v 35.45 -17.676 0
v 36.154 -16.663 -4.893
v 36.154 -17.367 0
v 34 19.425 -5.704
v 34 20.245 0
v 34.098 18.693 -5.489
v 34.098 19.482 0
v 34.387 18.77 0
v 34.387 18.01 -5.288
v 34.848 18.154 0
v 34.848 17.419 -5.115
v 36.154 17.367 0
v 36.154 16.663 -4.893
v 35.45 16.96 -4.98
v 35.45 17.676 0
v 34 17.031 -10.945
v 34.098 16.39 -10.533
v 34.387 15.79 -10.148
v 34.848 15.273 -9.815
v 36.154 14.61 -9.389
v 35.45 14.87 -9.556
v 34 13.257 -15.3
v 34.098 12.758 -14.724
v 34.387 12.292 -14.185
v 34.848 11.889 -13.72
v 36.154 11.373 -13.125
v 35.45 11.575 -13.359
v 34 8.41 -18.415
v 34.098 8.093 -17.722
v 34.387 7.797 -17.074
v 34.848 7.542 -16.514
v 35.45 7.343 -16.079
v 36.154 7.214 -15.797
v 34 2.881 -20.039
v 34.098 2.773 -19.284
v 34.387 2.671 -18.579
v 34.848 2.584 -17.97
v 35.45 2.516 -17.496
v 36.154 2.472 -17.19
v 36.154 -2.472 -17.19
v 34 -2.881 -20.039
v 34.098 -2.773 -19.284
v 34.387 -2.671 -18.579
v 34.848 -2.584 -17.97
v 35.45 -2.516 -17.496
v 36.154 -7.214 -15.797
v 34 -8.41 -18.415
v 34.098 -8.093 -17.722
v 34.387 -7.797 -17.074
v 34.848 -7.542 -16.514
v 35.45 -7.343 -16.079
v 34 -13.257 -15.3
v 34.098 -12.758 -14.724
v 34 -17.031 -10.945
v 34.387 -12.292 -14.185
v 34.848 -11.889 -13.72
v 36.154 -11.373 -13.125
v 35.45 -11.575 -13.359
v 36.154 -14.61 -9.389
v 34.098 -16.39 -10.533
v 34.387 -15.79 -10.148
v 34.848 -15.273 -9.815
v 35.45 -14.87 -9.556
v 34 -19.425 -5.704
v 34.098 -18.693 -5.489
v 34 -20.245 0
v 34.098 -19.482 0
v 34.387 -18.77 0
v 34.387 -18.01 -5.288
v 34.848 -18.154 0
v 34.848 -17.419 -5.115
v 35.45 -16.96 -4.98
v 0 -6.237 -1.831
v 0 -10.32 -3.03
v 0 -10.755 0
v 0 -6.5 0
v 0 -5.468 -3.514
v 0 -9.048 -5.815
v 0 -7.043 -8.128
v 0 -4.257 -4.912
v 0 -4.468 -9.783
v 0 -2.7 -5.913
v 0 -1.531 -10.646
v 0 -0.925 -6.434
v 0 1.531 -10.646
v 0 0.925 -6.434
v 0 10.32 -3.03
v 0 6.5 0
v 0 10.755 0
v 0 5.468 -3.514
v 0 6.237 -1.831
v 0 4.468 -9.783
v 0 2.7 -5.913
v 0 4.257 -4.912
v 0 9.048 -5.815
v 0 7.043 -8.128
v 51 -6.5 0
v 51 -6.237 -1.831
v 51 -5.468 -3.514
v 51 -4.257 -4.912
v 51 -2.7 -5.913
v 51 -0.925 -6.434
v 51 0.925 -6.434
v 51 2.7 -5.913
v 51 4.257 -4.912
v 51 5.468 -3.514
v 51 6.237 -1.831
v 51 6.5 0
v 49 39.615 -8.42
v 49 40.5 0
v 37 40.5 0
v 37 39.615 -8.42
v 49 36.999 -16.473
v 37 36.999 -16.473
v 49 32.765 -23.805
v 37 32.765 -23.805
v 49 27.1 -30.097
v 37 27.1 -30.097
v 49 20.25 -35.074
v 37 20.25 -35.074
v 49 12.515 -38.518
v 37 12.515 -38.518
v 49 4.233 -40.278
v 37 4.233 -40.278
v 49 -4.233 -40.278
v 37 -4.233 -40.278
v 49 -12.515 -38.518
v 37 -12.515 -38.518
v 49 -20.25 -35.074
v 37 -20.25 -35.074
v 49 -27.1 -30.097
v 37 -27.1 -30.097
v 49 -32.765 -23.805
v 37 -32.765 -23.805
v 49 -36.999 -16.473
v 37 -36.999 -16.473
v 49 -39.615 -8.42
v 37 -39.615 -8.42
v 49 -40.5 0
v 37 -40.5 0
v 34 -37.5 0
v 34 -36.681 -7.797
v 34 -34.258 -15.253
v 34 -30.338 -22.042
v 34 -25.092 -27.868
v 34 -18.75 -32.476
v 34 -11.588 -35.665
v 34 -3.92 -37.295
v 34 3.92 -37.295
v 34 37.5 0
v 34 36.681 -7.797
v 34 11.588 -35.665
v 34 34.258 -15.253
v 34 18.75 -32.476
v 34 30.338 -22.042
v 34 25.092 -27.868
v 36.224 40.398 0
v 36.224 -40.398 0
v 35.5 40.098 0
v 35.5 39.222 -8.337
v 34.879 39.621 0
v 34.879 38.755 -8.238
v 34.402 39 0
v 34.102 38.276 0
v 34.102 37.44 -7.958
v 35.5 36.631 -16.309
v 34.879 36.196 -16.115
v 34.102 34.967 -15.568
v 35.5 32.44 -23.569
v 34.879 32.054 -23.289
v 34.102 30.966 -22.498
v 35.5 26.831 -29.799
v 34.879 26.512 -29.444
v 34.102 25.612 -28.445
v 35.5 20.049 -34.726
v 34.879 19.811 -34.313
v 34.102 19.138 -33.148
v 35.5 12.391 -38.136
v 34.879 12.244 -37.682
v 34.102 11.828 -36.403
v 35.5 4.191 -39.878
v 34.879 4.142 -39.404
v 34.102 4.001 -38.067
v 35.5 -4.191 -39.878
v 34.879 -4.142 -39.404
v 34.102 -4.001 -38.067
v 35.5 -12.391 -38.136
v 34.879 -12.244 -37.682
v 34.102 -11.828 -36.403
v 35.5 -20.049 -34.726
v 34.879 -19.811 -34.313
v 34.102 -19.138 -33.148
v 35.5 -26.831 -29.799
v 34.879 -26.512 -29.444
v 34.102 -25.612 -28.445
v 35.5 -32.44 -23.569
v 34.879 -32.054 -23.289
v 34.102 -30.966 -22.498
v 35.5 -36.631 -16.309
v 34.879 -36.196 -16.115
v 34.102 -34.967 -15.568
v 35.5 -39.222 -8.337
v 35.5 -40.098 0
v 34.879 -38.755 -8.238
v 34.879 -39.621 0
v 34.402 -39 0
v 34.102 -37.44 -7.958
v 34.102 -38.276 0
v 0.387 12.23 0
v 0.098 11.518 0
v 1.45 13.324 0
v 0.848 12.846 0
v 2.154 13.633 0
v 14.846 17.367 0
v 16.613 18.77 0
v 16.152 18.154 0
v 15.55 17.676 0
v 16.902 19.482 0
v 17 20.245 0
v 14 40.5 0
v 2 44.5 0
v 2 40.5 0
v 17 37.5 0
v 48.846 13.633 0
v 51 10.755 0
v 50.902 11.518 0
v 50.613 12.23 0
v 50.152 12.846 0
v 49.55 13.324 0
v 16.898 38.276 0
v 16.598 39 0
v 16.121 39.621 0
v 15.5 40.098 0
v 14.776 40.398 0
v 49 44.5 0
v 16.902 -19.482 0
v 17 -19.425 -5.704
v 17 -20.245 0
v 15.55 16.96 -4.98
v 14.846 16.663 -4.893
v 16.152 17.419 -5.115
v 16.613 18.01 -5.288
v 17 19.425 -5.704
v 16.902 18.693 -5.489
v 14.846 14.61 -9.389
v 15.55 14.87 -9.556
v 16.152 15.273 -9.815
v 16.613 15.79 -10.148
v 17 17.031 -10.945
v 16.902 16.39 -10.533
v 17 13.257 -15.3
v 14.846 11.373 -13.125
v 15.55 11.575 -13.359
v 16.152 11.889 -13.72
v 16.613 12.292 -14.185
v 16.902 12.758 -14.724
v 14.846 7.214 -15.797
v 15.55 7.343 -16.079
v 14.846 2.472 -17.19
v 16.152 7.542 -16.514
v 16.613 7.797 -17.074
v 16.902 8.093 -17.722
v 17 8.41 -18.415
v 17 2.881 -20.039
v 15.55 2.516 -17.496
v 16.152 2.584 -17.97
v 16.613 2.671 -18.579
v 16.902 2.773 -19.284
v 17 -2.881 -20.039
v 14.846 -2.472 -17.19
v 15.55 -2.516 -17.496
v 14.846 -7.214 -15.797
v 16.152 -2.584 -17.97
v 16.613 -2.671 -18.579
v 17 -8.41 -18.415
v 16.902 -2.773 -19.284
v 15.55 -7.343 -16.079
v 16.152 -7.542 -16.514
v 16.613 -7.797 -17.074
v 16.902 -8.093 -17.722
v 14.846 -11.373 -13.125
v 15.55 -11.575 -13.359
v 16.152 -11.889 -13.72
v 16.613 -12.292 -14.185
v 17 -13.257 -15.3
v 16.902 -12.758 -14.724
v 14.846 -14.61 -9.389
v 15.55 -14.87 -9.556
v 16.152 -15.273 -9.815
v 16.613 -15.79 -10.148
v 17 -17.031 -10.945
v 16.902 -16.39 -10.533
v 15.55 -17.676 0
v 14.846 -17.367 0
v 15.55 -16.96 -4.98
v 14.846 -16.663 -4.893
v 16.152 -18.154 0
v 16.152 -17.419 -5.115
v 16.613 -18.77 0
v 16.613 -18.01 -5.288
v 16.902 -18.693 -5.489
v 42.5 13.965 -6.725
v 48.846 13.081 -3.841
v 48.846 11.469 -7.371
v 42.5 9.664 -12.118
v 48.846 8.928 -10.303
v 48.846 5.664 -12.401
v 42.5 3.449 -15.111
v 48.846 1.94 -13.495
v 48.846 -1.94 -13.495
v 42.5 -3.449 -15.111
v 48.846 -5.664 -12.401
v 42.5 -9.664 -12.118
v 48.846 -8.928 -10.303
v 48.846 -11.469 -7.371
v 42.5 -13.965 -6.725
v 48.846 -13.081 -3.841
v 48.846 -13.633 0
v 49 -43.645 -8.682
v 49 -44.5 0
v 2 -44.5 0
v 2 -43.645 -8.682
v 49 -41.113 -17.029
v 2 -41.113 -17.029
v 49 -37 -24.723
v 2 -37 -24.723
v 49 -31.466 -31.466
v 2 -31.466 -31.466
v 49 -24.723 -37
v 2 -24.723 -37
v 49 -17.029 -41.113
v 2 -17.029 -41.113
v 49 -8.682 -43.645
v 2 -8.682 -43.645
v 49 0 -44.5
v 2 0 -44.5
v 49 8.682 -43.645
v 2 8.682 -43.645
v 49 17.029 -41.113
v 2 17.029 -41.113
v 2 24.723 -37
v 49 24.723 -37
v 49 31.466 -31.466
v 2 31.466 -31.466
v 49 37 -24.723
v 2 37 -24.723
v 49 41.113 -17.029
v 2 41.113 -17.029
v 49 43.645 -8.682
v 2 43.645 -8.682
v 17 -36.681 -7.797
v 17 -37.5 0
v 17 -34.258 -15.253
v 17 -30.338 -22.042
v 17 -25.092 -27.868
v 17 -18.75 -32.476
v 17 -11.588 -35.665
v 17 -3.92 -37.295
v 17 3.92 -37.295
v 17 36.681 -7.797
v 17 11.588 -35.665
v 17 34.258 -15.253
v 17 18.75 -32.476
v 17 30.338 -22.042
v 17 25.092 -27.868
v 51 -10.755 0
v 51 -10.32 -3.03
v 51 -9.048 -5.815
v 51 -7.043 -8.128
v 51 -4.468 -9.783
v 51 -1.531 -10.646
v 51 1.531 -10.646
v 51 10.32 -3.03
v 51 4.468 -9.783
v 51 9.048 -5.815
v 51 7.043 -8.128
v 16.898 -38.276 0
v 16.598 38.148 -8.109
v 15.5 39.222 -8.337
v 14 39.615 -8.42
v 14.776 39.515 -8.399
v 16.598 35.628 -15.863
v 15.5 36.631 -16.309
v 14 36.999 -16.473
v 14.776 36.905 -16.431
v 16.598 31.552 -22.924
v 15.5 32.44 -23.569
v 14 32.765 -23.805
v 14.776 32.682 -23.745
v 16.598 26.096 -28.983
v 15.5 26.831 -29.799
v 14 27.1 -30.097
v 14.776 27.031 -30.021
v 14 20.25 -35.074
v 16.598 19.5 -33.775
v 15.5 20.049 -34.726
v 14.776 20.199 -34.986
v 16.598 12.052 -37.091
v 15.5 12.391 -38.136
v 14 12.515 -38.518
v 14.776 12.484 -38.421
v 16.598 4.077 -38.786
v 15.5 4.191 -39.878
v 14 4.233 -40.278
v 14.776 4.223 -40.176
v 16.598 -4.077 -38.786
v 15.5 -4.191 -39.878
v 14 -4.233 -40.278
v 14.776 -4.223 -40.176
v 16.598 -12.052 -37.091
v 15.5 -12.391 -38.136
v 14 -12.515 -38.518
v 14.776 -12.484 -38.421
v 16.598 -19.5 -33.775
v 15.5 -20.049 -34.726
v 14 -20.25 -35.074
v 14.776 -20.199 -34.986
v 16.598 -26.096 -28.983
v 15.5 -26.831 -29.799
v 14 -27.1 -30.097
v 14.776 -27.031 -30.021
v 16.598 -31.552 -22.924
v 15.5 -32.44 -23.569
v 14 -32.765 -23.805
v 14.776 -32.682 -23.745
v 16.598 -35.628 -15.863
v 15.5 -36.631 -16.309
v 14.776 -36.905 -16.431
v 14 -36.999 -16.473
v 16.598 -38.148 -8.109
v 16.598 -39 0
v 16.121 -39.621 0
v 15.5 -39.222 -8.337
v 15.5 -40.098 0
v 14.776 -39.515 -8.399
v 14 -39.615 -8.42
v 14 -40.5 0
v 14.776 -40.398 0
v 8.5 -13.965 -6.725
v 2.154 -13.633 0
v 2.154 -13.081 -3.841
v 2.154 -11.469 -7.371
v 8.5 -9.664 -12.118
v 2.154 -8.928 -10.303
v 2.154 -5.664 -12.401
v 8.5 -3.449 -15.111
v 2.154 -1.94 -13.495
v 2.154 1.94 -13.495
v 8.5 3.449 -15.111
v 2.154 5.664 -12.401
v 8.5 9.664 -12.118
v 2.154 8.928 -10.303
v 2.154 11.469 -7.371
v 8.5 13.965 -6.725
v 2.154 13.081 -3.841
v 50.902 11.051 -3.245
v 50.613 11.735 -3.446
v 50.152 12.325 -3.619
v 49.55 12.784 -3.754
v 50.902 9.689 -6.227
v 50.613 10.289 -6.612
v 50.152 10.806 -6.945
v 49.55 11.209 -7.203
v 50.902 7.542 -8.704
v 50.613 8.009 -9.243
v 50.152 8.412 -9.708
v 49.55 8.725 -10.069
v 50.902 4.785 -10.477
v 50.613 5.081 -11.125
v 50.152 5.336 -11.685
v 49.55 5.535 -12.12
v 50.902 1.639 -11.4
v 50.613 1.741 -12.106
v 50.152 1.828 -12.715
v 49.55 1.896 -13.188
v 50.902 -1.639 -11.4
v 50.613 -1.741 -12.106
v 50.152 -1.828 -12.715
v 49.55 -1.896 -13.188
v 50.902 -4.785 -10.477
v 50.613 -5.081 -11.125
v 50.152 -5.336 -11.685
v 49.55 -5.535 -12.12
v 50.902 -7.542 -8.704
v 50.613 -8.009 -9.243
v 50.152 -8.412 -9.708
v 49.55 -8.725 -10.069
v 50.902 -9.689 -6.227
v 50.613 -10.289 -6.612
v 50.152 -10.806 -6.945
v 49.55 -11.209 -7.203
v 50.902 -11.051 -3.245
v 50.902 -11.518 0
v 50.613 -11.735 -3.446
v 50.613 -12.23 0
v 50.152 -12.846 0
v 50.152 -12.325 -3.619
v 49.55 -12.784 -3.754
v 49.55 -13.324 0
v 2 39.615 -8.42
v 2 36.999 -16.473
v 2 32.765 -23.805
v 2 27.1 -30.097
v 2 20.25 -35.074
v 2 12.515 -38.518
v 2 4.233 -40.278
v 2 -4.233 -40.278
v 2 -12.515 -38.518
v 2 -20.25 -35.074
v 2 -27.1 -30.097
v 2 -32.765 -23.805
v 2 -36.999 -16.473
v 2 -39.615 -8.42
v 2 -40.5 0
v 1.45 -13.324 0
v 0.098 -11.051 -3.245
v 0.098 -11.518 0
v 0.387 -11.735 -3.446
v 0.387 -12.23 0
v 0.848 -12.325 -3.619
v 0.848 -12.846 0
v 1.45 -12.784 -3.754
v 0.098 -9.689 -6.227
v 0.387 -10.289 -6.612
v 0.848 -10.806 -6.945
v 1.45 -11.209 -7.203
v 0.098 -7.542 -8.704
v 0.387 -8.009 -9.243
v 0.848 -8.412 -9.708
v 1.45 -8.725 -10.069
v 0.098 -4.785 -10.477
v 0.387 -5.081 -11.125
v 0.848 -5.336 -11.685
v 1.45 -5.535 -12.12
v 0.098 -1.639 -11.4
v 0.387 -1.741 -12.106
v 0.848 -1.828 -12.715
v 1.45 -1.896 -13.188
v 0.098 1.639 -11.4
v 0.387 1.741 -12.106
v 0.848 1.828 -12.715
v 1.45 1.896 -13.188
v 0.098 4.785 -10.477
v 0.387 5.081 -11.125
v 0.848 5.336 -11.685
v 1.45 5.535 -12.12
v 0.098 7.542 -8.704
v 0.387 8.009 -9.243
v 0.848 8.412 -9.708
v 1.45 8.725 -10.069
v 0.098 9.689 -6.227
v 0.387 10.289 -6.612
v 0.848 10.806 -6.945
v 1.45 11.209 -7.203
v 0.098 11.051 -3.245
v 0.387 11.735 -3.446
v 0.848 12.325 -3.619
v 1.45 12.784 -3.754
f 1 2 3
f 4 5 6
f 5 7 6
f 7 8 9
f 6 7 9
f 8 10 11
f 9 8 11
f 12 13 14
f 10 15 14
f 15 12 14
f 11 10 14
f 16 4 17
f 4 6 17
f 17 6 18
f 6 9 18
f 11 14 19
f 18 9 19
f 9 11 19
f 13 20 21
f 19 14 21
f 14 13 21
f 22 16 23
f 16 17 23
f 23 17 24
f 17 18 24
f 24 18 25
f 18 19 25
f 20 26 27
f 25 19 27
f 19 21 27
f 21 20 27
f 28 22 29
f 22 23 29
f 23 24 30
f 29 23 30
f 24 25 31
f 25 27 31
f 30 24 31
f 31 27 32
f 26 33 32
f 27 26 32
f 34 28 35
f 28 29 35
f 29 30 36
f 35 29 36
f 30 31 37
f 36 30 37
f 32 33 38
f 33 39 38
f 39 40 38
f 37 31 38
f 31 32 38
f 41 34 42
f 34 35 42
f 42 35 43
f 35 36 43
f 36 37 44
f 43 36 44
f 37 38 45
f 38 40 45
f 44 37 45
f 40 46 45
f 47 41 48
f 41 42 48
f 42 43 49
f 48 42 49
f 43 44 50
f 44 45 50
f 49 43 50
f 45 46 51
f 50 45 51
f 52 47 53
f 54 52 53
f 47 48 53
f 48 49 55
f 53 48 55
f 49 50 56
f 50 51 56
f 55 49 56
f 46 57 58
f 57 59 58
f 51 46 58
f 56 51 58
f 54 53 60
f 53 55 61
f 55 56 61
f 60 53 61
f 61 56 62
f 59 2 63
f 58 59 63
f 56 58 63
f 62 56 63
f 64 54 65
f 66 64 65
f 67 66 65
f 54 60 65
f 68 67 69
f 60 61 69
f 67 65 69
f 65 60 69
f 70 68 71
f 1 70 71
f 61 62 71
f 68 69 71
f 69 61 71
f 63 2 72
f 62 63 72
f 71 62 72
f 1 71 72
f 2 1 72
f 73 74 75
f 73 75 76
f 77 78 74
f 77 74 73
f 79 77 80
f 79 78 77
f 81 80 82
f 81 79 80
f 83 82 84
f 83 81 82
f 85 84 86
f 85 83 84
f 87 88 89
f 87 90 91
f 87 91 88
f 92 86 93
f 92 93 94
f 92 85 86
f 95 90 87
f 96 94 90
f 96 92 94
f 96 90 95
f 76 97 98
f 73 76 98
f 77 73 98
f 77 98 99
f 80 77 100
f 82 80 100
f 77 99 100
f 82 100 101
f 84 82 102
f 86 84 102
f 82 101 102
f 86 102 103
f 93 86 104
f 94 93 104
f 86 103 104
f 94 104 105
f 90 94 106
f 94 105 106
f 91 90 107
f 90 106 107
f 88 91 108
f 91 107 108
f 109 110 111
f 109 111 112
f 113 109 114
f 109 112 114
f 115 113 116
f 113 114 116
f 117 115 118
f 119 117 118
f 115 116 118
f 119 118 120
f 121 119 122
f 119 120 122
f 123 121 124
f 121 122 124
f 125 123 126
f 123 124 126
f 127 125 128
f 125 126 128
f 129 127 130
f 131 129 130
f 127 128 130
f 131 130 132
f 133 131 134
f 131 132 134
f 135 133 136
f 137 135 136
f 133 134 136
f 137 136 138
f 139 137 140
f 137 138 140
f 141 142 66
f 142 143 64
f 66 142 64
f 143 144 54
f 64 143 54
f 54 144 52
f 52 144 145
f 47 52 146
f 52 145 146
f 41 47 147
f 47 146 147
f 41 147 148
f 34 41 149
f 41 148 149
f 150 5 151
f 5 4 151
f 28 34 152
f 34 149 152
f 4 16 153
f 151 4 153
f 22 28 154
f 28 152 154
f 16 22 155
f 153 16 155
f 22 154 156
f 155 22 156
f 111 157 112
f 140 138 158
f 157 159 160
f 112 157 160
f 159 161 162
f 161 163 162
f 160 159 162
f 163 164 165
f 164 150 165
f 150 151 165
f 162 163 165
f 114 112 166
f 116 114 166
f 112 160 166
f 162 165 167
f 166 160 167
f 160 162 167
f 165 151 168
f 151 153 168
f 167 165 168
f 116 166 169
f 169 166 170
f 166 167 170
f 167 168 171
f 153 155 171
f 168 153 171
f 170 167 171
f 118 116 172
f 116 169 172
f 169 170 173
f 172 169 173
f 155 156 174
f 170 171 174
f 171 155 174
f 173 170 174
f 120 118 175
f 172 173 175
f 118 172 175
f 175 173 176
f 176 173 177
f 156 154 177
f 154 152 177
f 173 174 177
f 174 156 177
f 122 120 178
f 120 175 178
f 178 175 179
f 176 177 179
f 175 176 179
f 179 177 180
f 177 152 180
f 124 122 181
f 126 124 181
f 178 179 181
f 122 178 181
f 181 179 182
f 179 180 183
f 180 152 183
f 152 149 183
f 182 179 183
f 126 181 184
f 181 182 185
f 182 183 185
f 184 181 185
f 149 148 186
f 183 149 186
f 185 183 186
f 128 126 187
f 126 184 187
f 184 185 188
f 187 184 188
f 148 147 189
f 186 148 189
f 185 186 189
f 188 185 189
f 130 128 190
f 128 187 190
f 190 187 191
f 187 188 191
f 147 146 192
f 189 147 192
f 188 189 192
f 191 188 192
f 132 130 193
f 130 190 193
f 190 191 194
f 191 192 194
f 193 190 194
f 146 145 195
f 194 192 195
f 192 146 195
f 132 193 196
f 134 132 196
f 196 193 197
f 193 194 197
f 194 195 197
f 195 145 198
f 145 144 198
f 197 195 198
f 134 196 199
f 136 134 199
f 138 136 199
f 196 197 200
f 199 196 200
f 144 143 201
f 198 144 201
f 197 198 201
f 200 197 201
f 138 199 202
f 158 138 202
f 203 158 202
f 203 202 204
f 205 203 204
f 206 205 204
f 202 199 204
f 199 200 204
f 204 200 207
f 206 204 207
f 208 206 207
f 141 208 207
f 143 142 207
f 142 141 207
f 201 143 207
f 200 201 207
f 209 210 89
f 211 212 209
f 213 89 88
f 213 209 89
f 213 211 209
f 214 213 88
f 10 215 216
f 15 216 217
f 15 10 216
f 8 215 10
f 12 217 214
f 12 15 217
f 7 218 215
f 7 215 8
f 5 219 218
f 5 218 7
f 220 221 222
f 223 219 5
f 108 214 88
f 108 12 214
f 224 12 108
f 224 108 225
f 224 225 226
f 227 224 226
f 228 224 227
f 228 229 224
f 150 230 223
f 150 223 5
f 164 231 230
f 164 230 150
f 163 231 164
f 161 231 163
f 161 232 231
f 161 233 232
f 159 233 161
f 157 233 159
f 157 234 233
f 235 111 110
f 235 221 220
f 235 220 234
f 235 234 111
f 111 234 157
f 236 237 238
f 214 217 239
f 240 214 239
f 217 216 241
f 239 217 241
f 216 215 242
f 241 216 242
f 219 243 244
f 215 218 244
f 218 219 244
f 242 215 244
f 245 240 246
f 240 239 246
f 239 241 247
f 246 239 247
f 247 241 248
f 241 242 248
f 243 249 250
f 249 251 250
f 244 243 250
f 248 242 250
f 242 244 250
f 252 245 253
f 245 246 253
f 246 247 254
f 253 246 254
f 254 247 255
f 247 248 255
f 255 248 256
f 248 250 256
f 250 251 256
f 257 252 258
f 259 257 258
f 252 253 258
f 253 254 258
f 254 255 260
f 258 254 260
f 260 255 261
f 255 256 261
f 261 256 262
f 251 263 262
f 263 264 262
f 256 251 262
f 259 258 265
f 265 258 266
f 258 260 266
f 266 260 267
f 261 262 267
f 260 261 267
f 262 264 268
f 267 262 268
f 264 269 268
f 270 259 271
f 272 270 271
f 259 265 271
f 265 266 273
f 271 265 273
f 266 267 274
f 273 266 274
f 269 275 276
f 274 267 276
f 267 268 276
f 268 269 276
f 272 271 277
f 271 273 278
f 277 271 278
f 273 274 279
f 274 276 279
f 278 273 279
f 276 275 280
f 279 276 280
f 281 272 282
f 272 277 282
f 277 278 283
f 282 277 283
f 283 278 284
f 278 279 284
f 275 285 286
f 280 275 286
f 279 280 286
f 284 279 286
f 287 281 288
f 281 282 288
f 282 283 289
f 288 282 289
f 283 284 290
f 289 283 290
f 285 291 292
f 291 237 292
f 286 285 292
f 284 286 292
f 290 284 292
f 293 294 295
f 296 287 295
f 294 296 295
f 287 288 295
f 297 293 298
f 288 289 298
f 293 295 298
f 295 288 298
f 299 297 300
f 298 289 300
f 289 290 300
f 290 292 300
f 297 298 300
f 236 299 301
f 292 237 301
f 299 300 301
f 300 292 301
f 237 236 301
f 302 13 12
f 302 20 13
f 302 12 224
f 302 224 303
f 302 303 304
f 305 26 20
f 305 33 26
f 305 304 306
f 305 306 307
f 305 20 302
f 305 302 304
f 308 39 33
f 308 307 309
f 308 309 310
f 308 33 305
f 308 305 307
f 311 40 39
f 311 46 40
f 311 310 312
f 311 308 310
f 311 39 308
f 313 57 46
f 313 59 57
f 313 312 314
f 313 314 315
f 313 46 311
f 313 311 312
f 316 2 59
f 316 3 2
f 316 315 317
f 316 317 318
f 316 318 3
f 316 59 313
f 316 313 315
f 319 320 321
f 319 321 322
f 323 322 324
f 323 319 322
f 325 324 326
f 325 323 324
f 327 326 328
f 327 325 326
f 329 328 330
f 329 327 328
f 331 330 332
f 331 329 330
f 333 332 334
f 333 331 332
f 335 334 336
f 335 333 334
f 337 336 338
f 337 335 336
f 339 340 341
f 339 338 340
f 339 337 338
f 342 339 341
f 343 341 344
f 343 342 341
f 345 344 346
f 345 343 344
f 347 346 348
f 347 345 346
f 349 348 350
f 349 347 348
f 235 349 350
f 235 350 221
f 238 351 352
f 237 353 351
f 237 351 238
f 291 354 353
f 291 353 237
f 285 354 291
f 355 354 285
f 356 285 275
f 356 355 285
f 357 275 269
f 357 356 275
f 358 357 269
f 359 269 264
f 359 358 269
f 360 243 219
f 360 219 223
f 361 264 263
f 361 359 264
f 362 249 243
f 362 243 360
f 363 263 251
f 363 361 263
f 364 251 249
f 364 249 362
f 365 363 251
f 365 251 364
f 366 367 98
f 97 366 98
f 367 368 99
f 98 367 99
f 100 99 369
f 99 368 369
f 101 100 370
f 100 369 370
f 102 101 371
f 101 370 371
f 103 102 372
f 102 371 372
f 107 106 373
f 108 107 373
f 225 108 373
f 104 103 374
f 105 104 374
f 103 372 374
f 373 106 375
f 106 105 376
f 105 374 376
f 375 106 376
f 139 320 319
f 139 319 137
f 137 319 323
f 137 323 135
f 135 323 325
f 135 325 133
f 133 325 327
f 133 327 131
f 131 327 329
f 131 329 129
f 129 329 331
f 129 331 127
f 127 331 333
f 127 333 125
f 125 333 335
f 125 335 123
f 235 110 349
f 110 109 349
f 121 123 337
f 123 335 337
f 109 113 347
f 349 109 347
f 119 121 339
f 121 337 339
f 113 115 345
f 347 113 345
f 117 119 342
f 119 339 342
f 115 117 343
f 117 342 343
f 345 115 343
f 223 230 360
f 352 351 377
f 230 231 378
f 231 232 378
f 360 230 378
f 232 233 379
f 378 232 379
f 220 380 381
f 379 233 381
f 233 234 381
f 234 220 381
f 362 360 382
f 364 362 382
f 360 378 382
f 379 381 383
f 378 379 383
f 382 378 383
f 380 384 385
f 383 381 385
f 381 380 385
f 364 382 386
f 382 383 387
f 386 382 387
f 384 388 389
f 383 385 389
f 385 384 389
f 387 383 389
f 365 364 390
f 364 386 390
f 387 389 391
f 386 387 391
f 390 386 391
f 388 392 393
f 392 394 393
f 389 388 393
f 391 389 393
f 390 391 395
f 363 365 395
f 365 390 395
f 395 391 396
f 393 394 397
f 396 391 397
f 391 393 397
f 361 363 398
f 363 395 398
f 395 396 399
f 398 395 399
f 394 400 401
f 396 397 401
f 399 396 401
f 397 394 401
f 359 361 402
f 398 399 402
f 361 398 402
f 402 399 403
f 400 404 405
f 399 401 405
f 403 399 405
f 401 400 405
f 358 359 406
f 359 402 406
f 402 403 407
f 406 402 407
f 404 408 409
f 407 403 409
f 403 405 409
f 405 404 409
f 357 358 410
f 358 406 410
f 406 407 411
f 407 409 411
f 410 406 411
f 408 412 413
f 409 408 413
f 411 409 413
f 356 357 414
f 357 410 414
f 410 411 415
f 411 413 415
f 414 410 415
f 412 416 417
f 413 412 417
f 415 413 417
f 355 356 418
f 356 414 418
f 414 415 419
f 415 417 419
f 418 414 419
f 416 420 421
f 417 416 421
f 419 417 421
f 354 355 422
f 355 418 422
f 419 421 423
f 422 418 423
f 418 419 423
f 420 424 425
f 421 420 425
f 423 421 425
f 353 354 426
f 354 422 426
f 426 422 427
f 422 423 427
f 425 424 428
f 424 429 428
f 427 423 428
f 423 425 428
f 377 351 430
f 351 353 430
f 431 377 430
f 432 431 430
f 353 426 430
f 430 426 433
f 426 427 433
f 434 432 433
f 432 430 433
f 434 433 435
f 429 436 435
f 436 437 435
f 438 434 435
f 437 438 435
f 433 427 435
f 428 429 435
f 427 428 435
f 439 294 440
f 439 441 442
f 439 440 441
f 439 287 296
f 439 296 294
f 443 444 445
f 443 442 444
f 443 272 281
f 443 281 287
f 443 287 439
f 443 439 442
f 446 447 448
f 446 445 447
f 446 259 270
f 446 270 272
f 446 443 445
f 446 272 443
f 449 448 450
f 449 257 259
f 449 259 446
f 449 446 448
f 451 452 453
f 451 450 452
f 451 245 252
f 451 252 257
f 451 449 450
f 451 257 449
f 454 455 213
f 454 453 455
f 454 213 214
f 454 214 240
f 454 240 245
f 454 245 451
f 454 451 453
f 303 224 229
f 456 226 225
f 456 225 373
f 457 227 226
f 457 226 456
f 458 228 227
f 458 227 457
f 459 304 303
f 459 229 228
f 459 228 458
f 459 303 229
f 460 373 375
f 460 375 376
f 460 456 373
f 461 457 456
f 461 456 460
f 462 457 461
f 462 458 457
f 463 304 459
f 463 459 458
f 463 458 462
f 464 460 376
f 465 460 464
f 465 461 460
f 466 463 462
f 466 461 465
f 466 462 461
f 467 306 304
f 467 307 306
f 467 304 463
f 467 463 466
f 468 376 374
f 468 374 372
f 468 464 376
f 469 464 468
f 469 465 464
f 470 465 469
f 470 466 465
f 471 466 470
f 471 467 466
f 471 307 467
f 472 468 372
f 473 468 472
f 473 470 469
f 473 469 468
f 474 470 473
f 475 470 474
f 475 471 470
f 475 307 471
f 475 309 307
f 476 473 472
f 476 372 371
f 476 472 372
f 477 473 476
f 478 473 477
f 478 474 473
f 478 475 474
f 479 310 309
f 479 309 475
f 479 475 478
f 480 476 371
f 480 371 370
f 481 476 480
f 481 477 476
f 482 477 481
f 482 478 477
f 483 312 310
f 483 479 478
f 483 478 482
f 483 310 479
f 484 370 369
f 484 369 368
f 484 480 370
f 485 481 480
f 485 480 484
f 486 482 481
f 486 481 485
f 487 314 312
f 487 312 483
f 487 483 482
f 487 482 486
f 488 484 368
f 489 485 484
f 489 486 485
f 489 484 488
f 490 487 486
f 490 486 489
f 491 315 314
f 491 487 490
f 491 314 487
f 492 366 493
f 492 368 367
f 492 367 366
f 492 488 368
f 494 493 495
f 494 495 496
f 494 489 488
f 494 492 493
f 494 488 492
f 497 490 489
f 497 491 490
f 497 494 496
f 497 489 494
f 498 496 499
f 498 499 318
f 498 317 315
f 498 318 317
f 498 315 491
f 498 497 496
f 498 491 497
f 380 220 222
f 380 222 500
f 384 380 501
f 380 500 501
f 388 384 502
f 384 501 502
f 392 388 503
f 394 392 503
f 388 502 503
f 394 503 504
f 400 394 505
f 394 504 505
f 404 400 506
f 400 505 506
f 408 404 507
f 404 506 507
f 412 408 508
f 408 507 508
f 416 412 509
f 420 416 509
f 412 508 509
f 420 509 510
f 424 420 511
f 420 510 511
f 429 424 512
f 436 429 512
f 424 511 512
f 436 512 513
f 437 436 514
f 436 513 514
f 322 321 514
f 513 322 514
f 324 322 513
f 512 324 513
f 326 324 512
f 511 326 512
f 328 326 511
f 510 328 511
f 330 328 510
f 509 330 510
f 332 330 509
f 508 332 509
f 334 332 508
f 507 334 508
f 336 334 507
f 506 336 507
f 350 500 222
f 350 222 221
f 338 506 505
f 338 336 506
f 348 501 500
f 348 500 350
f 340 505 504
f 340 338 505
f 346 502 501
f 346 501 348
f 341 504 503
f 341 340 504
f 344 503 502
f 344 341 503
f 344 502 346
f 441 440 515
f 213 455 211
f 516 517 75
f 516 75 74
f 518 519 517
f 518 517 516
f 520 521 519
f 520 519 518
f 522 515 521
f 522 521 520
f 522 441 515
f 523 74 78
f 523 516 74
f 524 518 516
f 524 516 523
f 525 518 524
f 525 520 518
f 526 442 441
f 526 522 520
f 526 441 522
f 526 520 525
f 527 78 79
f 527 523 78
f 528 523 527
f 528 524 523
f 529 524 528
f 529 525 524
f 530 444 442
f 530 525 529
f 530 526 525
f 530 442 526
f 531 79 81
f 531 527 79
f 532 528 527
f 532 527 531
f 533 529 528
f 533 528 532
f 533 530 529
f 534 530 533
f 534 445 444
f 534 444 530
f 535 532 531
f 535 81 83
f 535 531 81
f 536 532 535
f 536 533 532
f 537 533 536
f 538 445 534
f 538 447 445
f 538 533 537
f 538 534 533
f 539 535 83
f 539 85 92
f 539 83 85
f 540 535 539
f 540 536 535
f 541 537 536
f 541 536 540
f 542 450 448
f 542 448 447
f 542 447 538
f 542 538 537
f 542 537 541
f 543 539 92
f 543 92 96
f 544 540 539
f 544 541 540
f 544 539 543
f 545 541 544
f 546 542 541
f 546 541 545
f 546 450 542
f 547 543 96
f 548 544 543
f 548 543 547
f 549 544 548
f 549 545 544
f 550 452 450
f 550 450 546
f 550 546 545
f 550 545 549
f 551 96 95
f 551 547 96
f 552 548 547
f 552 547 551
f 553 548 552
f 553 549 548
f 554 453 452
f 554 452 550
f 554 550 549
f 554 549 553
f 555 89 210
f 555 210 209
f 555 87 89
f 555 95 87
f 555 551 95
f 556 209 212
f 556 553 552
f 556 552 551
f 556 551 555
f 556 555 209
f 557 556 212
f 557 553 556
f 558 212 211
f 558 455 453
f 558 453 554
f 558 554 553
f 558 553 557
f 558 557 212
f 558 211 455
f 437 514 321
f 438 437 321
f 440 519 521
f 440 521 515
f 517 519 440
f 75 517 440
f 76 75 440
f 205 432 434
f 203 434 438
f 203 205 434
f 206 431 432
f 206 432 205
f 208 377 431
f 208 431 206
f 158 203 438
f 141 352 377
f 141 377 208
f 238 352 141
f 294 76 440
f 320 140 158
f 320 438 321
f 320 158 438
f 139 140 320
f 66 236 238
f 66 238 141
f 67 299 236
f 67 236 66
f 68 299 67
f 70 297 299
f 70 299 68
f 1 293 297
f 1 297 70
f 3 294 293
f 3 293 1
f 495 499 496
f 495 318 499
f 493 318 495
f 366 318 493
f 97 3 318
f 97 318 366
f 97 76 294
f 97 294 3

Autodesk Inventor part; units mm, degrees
ref_plane "YZ Plane" through (0, 0, 0) normal (1, 0, 0) x (0, 1, 0)
ref_plane "XZ Plane" through (0, 0, 0) normal (0, 1, 0) x (-1, 0, 0)
ref_plane "XY Plane" through (0, 0, 0) normal (0, 0, 1) x (1, 0, 0)
sketch "草圖1" plane through (0, 0, 0) normal (0, 0, 1) x (1, 0, 0)
  line L0 (0, 0) -> (0, 13)
  line L1 (0, 13) -> (14.8465, 17.3666)
  line L2 (17, 20.2447) -> (17, 37.5)
  line L3 (14, 40.5) -> (2, 40.5)
  line L4 (2, 44.5) -> (49, 44.5)
  line L5 (49, 40.5) -> (37, 40.5)
  line L6 (34, 37.5) -> (34, 20.2447)
  line L7 (36.1535, 17.3666) -> (51, 13)
  line L8 (51, 13) -> (51, 0)
  line L9 (51, 0) -> (0, 0)
  line L10 (2, 40.5) -> (2, 44.5)
  line L11 (49, 40.5) -> (49, 44.5)
  line L12 (25.5, 0) -> (25.5, 70.2145)
  arc A0 (14.8465, 17.3666) -> (17, 20.2447) centre (14, 20.2447) ccw
  arc A1 (34, 20.2447) -> (36.1535, 17.3666) centre (37, 20.2447) ccw
  arc A2 (17, 37.5) -> (14, 40.5) centre (14, 37.5) ccw
  arc A3 (37, 40.5) -> (34, 37.5) centre (37, 37.5) ccw
  point P0 (17, 18)
  point P1 (17, 40.5)
  point P2 (34, 40.5)
  point P3 (34, 18)
  dimension "d0" = 51
  dimension "d1" = 47
  dimension "d2" = 17
  dimension "d3" = 18
  dimension "d4" = 4
  dimension "d5" = 40.5
  dimension "d6" = 15
  dimension "d7" = 18
  dimension "d8" = 13
  dimension "d9" = 13
  dimension "d10" = 3
revolve "迴轉1" add sketch "草圖1" angle 180 about axis through (51, 0, 0) along (-1, 0, 0)
sketch "草圖2" plane through (51, 0, 0) normal (1, 0, 0) x (0, 0, -1)
  circle A0 centre (0, 0) radius 6.5
  dimension "d13" = 13
extrude "擠出1" cut sketch "草圖2" against normal up to next
fillet "圓角1" radius 3 2 edges at (51, 0, -13) (0, 0, -13)
properties part number "練習二"
